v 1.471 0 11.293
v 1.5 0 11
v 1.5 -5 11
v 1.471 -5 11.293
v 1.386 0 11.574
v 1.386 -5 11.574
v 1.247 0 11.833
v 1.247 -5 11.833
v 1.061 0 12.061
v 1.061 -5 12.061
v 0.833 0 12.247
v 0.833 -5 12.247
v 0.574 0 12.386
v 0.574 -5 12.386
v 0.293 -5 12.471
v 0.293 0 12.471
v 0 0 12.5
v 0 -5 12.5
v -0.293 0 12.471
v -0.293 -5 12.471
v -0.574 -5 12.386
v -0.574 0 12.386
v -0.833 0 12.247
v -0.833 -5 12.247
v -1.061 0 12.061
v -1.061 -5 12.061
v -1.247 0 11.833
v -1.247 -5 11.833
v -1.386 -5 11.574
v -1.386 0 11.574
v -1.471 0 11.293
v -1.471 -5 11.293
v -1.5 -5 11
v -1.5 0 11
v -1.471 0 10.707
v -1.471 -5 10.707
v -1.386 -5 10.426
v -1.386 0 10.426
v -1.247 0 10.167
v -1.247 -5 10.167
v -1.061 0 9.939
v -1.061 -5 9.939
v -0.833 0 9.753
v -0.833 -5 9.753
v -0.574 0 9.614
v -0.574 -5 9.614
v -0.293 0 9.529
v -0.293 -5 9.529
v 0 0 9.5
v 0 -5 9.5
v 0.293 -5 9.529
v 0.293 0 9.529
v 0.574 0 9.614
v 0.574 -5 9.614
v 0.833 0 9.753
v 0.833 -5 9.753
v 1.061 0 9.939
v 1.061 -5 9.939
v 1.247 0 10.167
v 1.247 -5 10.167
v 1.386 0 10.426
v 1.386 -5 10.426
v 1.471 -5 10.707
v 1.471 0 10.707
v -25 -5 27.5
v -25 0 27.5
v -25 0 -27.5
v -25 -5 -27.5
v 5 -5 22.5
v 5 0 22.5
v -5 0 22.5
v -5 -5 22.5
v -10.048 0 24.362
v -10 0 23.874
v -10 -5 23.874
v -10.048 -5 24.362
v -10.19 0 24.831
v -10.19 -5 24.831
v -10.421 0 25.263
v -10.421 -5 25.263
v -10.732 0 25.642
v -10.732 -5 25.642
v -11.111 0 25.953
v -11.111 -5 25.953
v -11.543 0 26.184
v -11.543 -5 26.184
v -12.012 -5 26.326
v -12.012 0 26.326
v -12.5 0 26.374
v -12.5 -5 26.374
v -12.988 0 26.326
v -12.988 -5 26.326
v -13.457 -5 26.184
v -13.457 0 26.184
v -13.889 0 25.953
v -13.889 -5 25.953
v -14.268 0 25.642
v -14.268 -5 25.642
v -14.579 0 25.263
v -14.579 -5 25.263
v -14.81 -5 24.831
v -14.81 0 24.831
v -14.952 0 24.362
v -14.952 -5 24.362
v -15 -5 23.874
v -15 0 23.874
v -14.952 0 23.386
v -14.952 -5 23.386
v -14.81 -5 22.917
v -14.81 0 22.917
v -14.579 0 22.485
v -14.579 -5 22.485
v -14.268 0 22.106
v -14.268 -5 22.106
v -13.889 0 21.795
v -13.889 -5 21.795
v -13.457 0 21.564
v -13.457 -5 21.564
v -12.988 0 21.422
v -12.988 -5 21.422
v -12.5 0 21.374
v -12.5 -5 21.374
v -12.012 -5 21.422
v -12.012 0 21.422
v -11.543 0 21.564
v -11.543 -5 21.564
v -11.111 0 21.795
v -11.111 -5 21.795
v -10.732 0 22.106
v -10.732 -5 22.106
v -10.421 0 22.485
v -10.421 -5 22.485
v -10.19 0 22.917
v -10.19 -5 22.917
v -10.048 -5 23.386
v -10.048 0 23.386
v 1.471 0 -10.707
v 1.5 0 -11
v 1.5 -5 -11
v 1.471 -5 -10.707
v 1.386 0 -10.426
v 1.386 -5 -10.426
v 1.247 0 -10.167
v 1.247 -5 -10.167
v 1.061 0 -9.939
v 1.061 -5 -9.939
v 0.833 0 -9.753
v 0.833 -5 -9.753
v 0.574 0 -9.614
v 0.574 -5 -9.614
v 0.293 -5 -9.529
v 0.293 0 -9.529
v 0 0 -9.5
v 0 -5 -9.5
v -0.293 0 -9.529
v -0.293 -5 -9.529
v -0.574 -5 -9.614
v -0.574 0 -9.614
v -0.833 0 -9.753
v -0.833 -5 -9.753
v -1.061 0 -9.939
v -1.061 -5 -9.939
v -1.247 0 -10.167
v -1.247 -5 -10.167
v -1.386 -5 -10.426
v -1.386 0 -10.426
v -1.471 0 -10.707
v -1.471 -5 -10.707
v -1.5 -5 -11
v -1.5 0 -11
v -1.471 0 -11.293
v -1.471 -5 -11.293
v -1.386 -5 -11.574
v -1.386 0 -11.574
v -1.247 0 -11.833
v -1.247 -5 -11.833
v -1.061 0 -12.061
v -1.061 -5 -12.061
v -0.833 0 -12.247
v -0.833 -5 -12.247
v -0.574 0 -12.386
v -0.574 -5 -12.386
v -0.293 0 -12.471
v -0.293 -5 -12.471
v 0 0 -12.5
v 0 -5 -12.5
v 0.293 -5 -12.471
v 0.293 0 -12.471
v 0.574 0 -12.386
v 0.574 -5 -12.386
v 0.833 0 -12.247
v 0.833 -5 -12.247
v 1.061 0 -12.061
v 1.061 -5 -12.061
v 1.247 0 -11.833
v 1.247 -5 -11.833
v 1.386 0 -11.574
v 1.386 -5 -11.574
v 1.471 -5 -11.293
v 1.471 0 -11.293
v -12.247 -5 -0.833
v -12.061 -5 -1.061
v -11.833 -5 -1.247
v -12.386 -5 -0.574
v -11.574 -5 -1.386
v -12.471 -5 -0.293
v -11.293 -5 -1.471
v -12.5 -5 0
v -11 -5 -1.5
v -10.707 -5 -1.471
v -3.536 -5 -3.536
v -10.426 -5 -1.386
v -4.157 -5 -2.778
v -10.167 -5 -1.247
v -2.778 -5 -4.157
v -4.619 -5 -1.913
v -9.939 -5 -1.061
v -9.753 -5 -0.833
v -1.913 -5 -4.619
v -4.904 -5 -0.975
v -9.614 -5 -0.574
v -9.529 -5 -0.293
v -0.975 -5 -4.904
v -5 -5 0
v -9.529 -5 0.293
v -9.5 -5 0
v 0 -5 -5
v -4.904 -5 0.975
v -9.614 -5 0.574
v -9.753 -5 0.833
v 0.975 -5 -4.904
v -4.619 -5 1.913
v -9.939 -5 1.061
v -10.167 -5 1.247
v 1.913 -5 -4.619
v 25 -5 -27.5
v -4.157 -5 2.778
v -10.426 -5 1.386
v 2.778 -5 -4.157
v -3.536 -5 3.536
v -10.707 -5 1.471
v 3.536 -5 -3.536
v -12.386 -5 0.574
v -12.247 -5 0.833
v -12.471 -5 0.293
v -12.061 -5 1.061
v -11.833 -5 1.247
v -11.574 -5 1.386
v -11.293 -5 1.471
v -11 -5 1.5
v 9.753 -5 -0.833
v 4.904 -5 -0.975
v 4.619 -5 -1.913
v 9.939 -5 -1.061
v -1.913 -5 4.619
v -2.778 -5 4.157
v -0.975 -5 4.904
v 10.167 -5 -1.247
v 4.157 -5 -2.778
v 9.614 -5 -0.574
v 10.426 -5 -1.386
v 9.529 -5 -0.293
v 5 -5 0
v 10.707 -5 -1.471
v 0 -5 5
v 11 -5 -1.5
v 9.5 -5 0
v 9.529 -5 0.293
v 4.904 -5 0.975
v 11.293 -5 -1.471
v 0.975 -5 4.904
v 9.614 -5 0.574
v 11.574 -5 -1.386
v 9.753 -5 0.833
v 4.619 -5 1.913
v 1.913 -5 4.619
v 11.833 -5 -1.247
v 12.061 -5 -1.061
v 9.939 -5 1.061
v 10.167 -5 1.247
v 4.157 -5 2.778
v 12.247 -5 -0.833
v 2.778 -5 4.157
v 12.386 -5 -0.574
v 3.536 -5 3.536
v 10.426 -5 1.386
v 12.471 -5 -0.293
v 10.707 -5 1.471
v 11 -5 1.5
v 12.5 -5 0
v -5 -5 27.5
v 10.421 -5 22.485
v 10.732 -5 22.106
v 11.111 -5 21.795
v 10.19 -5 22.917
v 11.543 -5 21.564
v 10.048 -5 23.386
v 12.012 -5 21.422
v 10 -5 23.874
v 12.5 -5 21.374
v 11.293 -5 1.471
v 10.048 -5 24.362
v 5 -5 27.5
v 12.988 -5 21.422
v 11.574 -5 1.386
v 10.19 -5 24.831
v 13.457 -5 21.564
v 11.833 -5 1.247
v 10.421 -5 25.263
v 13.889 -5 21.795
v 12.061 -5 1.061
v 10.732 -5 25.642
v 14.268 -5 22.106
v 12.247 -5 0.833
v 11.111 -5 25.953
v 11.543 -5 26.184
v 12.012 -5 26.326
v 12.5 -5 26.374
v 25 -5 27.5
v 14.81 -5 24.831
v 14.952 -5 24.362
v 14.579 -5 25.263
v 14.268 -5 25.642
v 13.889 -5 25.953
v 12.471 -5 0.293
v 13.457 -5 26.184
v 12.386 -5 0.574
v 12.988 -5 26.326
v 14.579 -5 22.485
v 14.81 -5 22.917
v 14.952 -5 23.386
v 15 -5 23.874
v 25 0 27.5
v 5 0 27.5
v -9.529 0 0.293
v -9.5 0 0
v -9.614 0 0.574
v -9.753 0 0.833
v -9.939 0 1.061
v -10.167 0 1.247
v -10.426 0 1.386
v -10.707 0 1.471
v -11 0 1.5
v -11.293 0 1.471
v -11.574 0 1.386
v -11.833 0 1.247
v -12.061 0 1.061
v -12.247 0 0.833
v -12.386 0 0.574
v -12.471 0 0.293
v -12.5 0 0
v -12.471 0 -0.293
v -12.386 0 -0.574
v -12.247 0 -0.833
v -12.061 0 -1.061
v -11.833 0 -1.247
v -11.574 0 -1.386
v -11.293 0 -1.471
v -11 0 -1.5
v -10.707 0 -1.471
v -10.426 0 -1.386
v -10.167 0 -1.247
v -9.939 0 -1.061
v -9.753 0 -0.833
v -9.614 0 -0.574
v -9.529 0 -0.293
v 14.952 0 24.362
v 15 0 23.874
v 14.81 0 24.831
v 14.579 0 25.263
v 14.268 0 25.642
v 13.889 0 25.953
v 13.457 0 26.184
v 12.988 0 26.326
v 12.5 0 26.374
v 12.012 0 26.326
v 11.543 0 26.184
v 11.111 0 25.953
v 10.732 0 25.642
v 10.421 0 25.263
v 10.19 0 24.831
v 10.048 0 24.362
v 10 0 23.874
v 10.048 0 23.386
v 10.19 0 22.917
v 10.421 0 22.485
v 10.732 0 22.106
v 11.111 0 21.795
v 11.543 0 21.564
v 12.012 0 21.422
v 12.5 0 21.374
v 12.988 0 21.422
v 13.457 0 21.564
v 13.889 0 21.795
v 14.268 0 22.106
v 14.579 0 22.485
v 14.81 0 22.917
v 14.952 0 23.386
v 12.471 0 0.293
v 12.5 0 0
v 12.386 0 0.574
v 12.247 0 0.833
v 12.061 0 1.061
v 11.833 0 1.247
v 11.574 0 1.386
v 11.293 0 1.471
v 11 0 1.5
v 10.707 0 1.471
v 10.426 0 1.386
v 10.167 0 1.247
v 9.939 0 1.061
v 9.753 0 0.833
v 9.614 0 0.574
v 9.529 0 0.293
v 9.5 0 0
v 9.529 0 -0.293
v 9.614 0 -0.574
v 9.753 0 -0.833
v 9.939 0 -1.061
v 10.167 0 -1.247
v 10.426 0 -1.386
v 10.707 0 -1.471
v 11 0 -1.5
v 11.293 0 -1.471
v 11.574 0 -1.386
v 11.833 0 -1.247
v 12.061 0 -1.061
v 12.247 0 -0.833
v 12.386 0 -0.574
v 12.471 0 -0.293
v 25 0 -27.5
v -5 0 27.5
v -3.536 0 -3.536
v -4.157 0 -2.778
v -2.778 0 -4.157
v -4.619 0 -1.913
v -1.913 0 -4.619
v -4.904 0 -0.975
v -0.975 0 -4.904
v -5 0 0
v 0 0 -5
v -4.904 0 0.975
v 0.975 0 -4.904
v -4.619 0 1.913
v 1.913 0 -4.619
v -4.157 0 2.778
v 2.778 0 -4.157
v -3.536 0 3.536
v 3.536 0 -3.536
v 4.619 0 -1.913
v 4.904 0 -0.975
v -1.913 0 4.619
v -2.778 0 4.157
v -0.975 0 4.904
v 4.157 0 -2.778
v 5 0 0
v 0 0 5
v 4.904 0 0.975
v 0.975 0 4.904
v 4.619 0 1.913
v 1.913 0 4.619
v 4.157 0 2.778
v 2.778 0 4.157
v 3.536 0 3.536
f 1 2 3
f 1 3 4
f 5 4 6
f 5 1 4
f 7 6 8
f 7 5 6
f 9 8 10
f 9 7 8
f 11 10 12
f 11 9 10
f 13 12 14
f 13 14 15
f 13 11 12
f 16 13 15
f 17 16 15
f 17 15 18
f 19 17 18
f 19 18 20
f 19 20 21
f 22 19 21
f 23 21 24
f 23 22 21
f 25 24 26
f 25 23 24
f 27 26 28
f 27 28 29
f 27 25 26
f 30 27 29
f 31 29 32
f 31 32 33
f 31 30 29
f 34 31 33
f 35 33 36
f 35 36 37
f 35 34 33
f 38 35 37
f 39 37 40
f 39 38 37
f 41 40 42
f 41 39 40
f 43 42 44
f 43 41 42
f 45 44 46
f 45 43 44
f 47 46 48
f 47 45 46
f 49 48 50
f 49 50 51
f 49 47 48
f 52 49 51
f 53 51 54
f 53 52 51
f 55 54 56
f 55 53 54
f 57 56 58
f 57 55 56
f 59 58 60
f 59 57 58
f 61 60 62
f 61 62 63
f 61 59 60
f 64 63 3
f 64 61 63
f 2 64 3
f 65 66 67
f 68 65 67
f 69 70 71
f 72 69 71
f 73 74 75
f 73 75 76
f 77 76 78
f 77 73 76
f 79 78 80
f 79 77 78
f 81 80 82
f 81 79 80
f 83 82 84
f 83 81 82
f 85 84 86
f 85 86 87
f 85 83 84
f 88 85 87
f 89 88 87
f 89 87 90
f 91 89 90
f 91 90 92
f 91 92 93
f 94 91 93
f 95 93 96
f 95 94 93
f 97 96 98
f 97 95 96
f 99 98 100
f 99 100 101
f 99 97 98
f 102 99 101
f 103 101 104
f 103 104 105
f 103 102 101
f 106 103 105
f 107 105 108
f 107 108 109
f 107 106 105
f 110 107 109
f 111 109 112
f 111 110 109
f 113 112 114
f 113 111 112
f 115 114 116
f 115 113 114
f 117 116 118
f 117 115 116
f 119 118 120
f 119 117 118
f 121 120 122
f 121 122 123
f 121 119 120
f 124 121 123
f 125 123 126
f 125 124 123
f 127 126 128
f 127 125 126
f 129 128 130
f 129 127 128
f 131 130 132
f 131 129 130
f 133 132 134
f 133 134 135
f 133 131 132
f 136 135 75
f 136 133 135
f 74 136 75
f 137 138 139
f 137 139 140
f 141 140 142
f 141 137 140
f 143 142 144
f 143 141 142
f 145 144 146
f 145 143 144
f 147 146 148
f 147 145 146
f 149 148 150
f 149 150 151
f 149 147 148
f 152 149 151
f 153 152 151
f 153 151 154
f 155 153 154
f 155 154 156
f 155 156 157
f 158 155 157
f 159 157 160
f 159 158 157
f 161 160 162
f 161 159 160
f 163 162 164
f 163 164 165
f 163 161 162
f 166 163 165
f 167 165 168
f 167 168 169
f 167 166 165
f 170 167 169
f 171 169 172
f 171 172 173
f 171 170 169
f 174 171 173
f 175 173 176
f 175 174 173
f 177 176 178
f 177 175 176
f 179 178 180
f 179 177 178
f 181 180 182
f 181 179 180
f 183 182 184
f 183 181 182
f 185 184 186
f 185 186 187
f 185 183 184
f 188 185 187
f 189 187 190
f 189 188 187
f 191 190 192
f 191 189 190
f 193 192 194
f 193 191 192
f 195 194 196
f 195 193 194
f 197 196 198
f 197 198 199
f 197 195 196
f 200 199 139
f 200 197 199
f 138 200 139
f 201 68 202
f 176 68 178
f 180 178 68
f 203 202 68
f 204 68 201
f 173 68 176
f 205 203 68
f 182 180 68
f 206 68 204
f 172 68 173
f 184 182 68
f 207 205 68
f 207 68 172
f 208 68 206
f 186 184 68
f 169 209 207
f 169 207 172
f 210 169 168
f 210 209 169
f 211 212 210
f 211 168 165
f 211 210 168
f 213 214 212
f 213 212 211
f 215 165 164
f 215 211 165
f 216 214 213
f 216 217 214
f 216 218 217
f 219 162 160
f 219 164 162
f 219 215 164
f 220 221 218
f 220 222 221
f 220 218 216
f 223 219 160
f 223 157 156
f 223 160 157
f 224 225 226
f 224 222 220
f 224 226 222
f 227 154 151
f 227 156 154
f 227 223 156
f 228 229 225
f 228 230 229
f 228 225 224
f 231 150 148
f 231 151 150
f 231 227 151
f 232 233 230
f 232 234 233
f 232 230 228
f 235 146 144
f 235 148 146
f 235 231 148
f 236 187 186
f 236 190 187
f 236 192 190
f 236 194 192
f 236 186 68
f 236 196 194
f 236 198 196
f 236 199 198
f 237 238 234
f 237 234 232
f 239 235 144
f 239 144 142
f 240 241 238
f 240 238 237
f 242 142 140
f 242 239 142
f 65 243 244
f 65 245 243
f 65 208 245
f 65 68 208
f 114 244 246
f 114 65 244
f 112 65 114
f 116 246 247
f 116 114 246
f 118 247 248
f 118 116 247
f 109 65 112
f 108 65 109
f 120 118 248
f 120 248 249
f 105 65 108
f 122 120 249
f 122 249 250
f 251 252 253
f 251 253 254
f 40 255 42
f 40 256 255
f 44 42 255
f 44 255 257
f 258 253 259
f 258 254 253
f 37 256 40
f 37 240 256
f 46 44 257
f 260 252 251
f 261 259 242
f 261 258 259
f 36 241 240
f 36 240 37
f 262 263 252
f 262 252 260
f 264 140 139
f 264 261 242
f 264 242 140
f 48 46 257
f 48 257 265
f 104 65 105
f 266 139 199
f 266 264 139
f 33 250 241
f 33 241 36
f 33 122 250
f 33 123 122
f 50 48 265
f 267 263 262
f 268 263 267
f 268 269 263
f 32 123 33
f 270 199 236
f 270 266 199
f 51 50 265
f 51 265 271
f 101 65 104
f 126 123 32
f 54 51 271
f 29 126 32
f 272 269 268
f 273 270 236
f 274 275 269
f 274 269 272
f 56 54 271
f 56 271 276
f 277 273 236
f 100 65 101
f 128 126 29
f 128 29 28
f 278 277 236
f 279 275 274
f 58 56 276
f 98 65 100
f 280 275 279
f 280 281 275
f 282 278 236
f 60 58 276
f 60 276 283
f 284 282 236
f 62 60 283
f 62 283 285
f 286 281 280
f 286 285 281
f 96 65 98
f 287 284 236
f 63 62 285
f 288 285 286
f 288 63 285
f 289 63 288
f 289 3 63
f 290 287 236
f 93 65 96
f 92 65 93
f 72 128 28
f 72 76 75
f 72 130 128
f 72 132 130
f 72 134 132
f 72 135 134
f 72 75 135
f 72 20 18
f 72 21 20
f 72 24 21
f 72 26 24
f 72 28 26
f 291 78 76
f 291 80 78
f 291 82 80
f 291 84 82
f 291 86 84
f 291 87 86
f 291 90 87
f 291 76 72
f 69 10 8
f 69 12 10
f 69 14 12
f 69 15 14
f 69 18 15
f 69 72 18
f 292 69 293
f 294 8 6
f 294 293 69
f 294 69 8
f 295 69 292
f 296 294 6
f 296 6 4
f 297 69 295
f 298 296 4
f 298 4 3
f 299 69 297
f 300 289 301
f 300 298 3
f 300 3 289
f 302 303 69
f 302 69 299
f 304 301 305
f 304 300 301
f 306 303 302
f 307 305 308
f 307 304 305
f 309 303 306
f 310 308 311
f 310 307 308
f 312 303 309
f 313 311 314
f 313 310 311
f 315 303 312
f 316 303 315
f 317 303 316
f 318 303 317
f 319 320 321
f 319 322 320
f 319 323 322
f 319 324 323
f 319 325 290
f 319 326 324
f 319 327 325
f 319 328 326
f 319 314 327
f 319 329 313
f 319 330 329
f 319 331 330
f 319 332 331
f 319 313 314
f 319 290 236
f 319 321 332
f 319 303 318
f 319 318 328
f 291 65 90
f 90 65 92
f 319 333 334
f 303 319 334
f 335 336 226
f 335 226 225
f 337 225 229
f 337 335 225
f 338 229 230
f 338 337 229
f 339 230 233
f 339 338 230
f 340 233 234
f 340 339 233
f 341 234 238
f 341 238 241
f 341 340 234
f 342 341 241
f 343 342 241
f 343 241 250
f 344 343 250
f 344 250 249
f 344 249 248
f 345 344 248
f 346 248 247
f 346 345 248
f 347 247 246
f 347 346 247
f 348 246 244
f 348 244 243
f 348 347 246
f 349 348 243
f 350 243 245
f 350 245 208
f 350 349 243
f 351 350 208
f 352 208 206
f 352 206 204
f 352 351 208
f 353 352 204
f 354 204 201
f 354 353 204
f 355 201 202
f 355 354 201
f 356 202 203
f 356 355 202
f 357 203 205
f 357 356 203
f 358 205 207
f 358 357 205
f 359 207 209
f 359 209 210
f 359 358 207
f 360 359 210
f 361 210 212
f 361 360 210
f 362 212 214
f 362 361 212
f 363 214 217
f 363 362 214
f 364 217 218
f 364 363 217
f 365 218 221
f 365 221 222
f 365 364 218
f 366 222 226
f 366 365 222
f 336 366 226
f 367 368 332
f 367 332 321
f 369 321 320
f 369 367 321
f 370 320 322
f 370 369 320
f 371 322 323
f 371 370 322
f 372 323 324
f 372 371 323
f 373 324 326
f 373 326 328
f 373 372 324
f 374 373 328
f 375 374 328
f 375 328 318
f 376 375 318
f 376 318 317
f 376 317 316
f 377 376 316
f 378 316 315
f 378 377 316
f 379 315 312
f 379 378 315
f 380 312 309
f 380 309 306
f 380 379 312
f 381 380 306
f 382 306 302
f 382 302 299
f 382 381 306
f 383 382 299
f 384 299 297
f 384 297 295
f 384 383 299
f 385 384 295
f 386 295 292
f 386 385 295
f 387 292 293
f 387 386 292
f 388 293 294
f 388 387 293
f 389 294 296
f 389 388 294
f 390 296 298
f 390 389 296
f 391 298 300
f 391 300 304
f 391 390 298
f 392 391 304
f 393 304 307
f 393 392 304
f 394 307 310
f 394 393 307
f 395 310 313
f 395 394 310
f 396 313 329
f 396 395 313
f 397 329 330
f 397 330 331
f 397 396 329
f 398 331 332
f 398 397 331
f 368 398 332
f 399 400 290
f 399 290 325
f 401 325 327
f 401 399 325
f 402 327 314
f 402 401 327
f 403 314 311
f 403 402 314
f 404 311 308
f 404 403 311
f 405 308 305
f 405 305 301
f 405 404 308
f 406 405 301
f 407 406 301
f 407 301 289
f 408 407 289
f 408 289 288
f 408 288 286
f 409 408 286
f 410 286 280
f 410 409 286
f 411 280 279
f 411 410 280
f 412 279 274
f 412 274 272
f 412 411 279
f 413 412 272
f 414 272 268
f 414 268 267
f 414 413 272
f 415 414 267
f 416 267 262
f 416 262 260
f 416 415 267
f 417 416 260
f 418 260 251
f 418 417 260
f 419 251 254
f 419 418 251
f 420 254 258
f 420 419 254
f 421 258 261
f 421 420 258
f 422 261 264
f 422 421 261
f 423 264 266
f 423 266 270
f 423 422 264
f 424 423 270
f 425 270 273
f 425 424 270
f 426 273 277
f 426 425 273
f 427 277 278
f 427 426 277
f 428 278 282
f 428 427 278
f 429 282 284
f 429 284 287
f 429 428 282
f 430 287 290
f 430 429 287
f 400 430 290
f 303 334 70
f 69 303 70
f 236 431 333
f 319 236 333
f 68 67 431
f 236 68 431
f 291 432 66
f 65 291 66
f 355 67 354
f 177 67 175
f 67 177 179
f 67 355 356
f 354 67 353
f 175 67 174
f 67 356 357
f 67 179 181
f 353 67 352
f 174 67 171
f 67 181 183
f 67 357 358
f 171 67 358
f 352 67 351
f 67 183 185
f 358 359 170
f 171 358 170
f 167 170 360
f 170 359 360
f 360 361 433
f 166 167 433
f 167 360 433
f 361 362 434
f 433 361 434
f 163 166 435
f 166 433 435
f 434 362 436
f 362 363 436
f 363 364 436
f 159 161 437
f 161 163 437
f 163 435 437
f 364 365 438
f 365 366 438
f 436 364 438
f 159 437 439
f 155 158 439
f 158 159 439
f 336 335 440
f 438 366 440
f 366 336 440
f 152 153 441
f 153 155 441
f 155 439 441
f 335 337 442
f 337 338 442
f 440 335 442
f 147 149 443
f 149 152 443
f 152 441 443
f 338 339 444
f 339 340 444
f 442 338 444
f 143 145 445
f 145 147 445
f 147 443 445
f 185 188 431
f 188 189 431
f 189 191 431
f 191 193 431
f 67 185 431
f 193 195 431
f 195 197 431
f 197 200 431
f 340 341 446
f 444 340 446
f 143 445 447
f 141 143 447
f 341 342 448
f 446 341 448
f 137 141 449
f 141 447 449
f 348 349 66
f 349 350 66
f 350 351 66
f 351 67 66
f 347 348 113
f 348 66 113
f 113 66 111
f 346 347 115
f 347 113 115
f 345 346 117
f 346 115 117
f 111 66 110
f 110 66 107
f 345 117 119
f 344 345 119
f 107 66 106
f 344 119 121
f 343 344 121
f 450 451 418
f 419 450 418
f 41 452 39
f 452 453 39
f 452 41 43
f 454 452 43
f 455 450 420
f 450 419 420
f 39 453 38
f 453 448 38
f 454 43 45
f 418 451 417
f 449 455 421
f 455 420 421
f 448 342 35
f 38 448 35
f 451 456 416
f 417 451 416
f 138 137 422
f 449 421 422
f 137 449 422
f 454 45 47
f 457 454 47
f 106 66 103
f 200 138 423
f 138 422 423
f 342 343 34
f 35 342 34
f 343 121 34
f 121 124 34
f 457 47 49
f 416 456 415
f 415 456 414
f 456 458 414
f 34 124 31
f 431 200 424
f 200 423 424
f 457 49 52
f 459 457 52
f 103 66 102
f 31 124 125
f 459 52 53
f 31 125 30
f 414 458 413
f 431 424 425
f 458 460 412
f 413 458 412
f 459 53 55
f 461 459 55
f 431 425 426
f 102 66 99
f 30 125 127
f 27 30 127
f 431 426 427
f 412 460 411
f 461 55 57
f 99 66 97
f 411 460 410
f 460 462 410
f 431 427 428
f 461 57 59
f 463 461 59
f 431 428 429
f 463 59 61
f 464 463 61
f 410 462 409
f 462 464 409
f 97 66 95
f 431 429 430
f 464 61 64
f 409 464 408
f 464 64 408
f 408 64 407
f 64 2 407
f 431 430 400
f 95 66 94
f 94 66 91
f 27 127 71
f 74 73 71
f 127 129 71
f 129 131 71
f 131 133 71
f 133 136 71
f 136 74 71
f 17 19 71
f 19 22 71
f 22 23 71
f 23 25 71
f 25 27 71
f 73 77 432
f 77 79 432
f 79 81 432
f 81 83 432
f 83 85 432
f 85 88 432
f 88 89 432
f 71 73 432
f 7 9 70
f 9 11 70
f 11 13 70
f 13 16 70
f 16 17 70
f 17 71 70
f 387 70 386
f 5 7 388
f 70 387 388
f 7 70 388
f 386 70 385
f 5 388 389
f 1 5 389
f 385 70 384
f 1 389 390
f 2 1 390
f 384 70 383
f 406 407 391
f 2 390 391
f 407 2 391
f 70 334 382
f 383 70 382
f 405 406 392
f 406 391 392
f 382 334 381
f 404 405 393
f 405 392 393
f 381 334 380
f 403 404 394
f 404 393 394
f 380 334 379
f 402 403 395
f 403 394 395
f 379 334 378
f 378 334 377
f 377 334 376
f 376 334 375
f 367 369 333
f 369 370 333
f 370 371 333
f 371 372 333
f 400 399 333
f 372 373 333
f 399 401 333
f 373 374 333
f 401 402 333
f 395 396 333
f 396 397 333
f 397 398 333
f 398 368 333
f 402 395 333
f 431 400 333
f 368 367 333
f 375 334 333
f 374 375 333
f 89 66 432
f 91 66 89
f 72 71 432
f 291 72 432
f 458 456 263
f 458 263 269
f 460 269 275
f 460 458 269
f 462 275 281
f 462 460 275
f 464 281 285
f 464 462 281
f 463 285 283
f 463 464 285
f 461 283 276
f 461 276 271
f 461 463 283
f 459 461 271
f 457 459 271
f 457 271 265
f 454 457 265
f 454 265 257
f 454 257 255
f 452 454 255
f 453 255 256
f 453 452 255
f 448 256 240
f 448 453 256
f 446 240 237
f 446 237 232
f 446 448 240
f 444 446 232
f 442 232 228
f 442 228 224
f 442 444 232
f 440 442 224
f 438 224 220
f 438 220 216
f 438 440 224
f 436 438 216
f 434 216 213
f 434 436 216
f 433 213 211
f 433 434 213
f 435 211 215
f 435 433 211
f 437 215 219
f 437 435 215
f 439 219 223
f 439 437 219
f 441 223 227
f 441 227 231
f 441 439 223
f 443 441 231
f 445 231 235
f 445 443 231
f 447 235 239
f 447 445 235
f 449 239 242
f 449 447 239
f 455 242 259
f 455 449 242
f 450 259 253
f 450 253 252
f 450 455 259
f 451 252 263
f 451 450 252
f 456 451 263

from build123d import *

# Parameters (mm, degrees)
F0_R     = 1.5
F0_R_2   = 2.5
F0_R_3   = 5
F1_DEPTH = 5


with BuildPart() as f1:
    # F0 (on Front) → F1 (new body)
    with BuildSketch(Plane.XZ):
        Polygon((25, -27.5), (25, 27.5), (5, 27.5), (5, 22.5), (-5, 22.5), (-5, 27.5), (-25, 27.5), (-25, -27.5), (-17.784204334, -27.5), (-7.784204334, -27.5), align=None)
        with Locations((0, -11)):
            Circle(F0_R, mode=Mode.SUBTRACT)
        with Locations((-11, 0)):
            Circle(F0_R, mode=Mode.SUBTRACT)
        with Locations((-12.5, 23.8740361482)):
            Circle(F0_R_2, mode=Mode.SUBTRACT)
        Circle(F0_R_3, mode=Mode.SUBTRACT)
        with Locations((11, 0)):
            Circle(F0_R, mode=Mode.SUBTRACT)
        with Locations((0, 11)):
            Circle(F0_R, mode=Mode.SUBTRACT)
        with Locations((12.5, 23.8740361482)):
            Circle(F0_R_2, mode=Mode.SUBTRACT)
    extrude(amount=F1_DEPTH)


solid = f1.part
